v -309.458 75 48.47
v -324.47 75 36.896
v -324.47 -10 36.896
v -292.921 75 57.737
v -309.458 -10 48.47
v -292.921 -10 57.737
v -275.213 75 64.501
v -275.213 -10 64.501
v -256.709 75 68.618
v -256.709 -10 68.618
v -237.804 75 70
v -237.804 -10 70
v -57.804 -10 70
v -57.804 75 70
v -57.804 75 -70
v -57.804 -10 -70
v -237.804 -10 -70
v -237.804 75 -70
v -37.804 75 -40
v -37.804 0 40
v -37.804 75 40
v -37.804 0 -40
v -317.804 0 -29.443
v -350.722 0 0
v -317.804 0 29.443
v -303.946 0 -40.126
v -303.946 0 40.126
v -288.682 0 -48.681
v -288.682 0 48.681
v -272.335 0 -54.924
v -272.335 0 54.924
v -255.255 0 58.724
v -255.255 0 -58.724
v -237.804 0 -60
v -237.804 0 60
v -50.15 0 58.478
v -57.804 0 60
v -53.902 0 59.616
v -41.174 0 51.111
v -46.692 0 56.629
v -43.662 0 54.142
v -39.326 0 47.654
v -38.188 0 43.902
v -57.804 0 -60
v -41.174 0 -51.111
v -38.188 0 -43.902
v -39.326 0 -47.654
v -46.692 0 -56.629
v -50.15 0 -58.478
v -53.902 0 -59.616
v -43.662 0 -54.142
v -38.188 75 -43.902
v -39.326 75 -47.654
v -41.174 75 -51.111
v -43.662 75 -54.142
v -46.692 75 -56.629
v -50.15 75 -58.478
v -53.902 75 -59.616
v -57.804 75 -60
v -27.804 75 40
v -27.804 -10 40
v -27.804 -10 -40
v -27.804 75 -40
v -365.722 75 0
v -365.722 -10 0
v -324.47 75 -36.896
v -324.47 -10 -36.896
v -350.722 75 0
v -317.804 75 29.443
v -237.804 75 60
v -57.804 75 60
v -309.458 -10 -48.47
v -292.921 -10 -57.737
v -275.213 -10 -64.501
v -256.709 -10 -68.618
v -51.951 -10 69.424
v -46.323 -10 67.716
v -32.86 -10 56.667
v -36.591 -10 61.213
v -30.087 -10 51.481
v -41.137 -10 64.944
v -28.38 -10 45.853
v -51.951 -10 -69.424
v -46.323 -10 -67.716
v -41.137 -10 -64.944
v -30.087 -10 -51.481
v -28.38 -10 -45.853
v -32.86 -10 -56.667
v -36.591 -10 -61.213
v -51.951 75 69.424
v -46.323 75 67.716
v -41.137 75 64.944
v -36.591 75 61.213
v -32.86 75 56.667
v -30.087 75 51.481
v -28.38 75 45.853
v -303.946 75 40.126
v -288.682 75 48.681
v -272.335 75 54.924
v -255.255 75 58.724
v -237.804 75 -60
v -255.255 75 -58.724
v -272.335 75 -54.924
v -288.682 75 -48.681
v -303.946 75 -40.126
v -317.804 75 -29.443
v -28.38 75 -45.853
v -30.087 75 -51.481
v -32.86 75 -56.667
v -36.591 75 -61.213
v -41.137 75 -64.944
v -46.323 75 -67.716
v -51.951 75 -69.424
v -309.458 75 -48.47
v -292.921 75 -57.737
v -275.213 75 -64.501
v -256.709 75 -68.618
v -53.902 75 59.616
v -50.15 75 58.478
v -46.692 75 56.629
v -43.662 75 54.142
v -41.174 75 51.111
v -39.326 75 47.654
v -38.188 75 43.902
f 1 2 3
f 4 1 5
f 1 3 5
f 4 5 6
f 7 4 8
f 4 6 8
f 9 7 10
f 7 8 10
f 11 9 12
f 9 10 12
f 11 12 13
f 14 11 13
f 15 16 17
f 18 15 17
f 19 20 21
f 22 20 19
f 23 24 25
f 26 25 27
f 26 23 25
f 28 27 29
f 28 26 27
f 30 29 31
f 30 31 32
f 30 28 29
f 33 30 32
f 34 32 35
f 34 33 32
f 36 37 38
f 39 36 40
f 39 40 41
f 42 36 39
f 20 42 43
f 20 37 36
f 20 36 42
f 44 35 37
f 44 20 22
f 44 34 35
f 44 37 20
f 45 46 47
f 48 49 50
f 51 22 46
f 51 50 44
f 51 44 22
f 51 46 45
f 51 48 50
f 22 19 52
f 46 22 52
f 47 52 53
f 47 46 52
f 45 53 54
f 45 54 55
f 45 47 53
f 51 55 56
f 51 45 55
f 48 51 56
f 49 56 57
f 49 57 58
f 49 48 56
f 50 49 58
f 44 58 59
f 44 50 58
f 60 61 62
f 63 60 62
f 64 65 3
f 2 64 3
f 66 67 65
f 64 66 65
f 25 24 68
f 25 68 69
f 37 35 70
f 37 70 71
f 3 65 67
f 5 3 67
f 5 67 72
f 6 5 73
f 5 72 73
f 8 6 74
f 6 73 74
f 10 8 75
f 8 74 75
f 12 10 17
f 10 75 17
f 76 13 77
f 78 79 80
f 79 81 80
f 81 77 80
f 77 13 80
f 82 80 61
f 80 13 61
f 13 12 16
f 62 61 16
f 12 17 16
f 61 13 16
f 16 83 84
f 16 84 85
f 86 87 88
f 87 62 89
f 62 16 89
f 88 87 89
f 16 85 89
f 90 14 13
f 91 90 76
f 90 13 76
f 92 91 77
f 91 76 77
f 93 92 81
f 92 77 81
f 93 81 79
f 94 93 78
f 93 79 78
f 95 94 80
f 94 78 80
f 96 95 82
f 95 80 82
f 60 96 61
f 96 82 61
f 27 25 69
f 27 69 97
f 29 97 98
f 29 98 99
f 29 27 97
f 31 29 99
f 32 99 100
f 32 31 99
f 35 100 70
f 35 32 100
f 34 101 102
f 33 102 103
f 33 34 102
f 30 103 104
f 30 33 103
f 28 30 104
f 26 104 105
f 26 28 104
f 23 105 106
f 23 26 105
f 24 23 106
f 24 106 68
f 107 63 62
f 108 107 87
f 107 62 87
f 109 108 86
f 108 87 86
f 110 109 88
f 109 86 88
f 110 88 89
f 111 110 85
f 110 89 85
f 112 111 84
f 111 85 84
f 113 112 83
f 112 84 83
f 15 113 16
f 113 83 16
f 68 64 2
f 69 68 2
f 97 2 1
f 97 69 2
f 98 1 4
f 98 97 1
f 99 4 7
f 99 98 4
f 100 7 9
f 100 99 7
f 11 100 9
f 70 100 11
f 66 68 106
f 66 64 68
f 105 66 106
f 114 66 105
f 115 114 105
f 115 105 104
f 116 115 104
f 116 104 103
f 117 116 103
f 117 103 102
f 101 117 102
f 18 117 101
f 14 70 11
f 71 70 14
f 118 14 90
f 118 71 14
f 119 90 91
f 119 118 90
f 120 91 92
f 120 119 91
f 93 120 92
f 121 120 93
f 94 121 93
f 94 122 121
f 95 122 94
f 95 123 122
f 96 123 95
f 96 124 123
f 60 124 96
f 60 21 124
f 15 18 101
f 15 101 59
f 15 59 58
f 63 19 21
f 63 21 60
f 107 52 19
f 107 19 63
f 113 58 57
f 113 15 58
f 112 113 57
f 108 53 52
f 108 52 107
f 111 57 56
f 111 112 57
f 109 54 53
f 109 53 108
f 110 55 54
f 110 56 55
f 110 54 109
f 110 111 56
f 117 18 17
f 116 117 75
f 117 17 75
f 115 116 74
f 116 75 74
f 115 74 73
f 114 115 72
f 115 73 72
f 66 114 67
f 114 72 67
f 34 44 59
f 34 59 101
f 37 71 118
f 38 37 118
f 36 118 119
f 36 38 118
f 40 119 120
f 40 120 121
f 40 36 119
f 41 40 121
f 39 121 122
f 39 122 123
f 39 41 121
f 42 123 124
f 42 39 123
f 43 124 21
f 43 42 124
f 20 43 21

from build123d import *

# Parameters (mm, degrees)
BOSS_EXTRUDE1_DEPTH = 75
SHELL1_T            = 10


with BuildPart() as part:
    # Sketch1 → Boss-Extrude1 (new body)
    with BuildSketch(Plane(origin=(0, 0, 0), x_dir=(1, 0, 0), z_dir=(0, 1, 0))):
        with BuildLine():
            Line((-317.803806735, 29.4427191), (-350.72176741, 0))
            Line((-350.72176741, 0), (-317.803806735, -29.4427191))
            ThreePointArc((-317.803806735, -29.4427191), (-280.622457508, -52.100683076), (-237.803806735, -60))
            Line((-237.803806735, -60), (-57.803806735, -60))
            ThreePointArc((-57.803806735, -60), (-43.661671111, -54.142135624), (-37.803806735, -40))
            Line((-37.803806735, -40), (-37.803806735, 40))
            ThreePointArc((-37.803806735, 40), (-43.661671111, 54.142135624), (-57.803806735, 60))
            Line((-57.803806735, 60), (-237.803806735, 60))
            ThreePointArc((-237.803806735, 60), (-280.622457508, 52.100683076), (-317.803806735, 29.4427191))
        make_face()
    extrude(amount=BOSS_EXTRUDE1_DEPTH)

    # Shell1
    shell1_openings = [part.faces().sort_by_distance(p)[0] for p in [
        (-177.328233539, 75, 0),
    ]]
    offset(amount=SHELL1_T, openings=shell1_openings, kind=Kind.INTERSECTION)


solid = part.part
